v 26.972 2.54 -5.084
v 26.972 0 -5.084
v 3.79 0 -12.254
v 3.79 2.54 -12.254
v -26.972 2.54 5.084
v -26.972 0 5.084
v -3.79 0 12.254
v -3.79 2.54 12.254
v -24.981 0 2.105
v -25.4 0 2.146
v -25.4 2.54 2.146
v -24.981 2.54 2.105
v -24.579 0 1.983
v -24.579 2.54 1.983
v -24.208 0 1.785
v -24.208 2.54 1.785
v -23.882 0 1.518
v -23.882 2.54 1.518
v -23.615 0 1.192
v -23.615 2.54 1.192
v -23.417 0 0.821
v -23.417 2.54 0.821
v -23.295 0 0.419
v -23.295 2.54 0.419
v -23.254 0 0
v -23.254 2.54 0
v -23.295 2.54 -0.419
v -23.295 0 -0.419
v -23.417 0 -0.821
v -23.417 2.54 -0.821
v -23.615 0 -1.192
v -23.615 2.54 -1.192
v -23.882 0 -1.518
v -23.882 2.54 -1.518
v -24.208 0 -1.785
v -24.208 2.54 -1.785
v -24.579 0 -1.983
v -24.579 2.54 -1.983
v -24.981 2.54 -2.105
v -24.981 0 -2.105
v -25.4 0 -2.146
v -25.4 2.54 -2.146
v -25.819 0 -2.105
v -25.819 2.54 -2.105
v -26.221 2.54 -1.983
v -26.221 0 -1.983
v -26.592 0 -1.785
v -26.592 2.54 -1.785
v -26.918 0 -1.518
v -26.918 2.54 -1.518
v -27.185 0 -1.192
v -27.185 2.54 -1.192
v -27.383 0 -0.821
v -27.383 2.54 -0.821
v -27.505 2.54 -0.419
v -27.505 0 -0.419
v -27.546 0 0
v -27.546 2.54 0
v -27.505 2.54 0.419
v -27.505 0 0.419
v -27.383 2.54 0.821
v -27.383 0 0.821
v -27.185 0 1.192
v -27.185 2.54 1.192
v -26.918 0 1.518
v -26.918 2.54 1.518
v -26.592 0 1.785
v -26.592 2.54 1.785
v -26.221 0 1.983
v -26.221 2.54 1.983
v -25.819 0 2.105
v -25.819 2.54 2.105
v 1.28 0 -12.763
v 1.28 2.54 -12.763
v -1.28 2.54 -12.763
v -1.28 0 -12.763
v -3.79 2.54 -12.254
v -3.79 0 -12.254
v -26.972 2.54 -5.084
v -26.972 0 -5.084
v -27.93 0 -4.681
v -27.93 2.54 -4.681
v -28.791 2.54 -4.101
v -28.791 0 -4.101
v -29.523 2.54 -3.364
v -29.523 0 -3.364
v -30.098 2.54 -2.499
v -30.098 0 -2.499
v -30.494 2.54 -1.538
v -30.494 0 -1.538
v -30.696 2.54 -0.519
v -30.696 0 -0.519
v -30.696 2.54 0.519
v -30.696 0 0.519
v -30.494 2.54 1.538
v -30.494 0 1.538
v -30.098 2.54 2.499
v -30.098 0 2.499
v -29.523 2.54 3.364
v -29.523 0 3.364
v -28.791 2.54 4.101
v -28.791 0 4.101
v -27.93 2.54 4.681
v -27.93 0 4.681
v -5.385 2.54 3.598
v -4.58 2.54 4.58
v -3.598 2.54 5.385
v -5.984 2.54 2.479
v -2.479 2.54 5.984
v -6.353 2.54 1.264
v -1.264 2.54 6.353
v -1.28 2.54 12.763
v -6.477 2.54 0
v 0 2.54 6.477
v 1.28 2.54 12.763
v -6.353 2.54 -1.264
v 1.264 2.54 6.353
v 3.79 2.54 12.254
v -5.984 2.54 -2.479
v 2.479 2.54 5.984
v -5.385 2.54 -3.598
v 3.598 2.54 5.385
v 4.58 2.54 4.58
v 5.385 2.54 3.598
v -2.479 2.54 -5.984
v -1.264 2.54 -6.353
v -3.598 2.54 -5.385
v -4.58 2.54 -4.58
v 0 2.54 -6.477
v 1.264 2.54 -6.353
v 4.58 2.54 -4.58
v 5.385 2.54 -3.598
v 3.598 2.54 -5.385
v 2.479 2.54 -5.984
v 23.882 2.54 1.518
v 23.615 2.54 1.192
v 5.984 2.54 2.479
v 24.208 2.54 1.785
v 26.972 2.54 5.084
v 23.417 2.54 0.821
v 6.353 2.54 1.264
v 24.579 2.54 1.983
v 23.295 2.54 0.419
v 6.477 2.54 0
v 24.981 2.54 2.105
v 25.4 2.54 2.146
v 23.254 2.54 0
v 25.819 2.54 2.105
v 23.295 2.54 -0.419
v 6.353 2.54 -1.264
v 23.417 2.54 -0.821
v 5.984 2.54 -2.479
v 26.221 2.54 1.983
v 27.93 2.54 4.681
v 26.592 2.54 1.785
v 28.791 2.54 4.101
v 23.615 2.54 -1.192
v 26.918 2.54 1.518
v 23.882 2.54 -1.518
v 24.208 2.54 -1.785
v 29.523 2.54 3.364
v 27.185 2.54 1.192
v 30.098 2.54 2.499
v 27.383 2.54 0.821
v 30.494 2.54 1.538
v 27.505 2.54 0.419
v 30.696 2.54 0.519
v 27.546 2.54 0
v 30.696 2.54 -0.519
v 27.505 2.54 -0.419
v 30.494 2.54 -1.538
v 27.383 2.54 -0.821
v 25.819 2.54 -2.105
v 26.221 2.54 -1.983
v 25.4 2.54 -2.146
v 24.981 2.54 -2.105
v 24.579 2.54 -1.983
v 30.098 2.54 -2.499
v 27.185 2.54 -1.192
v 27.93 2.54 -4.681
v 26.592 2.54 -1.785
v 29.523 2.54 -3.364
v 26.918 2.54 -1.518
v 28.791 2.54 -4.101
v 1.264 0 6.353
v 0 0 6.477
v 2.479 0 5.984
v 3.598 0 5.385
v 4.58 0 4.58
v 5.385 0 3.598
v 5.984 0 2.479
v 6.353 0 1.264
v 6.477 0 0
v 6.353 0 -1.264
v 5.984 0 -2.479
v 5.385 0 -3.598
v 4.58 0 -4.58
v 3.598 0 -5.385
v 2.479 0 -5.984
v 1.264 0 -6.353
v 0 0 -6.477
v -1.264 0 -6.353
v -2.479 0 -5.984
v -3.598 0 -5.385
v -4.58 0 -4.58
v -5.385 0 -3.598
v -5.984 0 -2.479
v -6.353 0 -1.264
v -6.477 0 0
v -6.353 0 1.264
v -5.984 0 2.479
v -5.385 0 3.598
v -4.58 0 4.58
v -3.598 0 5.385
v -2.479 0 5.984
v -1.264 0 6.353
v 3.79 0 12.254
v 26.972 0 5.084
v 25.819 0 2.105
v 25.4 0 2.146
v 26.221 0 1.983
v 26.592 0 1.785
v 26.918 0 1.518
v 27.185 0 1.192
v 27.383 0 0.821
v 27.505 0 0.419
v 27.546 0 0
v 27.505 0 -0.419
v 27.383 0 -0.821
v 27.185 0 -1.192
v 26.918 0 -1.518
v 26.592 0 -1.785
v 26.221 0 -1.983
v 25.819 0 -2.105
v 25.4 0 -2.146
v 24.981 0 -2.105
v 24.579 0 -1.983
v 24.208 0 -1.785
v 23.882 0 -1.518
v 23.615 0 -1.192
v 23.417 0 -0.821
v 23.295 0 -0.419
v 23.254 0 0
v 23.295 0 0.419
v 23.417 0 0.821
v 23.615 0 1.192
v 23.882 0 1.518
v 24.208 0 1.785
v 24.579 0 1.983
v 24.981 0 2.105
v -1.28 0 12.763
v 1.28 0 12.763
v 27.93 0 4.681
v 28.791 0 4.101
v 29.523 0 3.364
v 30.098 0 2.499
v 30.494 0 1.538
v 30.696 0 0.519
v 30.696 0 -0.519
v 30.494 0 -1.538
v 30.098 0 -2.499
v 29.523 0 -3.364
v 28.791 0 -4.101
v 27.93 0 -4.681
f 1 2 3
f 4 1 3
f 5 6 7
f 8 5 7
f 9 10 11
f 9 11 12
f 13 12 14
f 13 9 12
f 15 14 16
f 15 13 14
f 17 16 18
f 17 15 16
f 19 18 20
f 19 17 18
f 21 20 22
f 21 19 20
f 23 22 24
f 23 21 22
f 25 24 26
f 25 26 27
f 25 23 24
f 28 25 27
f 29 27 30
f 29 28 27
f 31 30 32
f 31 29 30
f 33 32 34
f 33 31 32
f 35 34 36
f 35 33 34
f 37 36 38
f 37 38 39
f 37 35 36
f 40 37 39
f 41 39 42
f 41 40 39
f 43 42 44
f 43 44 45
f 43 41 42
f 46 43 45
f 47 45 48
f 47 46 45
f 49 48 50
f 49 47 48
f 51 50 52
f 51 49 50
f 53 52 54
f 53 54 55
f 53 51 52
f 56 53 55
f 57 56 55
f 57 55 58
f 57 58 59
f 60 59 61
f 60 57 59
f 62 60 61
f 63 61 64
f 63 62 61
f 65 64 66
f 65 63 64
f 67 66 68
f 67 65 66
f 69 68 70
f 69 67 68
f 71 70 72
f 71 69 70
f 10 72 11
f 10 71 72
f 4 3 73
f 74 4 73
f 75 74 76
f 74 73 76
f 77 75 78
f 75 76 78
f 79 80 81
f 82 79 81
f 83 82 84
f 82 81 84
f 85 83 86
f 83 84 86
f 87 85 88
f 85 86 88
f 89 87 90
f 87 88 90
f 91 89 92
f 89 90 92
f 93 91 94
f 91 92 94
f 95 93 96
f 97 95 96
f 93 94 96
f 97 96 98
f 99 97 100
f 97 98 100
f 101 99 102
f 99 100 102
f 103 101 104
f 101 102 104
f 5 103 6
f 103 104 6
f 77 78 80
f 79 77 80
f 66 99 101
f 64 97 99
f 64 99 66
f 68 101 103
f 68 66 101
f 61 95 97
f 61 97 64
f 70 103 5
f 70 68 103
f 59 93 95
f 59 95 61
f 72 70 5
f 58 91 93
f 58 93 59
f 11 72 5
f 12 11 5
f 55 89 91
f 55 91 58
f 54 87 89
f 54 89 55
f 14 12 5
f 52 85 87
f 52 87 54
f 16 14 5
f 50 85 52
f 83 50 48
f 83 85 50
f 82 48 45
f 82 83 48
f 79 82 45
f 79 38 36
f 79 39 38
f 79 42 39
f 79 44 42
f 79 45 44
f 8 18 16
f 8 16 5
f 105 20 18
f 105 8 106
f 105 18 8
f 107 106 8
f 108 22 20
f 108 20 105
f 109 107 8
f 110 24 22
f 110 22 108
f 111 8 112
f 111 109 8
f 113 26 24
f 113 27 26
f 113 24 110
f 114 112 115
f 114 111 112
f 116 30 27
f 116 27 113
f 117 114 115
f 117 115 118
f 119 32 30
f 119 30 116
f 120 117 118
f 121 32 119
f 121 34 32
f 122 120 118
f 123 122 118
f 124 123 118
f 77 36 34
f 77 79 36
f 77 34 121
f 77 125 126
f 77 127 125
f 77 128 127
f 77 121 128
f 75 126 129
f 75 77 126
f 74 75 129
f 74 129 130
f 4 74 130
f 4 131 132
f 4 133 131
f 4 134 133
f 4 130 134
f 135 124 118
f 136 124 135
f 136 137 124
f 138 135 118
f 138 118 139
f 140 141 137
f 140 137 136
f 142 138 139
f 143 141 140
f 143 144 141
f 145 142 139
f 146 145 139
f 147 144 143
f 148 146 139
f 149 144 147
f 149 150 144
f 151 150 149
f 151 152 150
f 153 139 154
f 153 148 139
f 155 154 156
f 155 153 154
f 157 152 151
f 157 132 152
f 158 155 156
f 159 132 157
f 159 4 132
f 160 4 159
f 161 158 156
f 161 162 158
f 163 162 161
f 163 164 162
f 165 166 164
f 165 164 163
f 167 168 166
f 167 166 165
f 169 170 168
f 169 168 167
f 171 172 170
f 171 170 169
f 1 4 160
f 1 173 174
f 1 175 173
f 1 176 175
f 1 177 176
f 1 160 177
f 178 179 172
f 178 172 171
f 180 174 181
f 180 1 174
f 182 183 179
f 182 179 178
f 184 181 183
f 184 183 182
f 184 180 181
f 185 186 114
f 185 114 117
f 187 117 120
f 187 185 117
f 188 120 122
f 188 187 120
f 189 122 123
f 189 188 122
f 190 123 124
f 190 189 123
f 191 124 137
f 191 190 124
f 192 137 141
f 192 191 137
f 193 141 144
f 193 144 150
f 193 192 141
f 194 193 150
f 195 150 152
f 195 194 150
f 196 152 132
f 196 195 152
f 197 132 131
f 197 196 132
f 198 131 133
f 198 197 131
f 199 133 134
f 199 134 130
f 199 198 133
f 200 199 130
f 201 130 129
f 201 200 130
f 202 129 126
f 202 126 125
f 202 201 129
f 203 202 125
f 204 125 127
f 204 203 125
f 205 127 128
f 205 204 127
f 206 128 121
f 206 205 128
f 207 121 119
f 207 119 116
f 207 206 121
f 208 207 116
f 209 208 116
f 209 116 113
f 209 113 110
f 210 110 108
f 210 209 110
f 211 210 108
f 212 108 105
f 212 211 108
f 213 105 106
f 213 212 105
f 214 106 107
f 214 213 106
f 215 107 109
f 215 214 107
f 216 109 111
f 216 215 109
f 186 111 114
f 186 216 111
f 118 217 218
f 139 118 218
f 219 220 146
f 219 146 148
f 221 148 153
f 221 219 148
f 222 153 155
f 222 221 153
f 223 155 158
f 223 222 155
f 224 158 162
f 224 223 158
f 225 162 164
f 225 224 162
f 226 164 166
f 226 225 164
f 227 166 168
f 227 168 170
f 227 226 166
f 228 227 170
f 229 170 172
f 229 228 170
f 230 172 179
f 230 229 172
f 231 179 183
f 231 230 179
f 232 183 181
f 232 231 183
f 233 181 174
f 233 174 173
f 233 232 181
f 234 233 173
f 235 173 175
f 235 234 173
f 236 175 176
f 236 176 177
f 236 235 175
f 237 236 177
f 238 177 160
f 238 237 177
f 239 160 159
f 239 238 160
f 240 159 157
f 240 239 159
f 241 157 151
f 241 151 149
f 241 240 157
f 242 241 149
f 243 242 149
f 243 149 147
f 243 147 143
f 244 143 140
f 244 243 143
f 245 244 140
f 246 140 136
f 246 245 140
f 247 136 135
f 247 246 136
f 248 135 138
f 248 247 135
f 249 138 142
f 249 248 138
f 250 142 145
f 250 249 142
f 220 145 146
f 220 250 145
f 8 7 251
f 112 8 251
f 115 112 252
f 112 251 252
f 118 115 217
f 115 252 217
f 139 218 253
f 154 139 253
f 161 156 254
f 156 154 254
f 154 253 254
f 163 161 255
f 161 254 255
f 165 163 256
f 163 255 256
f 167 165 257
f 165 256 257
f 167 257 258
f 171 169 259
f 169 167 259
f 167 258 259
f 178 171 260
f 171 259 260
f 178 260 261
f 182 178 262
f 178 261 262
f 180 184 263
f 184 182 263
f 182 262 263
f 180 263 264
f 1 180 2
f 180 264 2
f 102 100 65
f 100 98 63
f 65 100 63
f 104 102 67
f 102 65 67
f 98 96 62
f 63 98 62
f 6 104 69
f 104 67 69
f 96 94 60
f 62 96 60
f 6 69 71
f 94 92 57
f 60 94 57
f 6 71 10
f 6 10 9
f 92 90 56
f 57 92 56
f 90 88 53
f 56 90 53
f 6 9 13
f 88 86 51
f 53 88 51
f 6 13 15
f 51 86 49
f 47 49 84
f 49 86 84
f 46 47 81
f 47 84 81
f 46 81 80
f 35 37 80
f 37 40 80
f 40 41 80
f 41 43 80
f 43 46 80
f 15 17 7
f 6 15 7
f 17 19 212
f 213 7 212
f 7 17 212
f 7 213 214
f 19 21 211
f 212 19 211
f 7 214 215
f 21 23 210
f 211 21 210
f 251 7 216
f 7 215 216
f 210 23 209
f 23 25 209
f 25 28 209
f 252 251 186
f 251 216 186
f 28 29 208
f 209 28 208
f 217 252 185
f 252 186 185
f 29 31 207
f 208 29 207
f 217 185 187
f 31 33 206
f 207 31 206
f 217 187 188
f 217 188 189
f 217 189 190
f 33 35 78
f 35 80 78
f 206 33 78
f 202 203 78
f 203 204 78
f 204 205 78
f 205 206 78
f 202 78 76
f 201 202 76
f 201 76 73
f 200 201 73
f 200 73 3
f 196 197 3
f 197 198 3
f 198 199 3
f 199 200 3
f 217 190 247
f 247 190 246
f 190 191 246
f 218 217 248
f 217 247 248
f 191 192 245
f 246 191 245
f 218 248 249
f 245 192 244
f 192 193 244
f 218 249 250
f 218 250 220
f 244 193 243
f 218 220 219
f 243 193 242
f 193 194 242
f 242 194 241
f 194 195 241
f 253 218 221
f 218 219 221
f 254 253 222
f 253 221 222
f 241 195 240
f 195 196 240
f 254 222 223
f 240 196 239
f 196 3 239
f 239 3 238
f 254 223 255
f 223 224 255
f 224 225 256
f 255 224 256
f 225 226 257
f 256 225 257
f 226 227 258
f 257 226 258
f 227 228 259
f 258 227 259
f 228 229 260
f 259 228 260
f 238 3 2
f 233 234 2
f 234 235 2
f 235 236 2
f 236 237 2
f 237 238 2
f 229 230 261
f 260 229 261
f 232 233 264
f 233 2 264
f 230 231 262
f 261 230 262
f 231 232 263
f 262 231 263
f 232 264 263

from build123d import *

# Parameters (mm, degrees)
SKETCH1_R           = 5.3213
SKETCH1_R_2         = 2.1463
SKETCH1_R_3         = 12.827
SKETCH1_R_4         = 6.477
BOSS_EXTRUDE1_DEPTH = 2.54


with BuildPart() as part:
    # Sketch1 → Boss-Extrude1 (new body)
    # profile 1 of 5: a face of its own
    with BuildSketch(Plane(origin=(0, 0, 0), x_dir=(1, 0, 0), z_dir=(0, 1, 0))):
        with BuildLine():
            Line((-3.7903785, 12.25418132), (-26.97244415, 5.08366532))
            ThreePointArc((-26.97244415, 5.08366532), (-22.241773707, 4.282737486), (-20.0787, 0))
            ThreePointArc((-20.0787, 0), (-22.241773707, -4.282737486), (-26.97244415, -5.08366532))
            Line((-26.97244415, -5.08366532), (-3.7903785, -12.25418132))
            ThreePointArc((-3.7903785, -12.25418132), (-12.827, 0), (-3.7903785, 12.25418132))
        make_face()
    # profile 2 of 5: a face of its own
    with BuildSketch(Plane(origin=(0, 0, 0), x_dir=(1, 0, 0), z_dir=(0, 1, 0))):
        with Locations((-25.4, 0)):
            Circle(SKETCH1_R)
        with Locations(Location((-25.4, 0, 0), (0, 0, 270))):
            Circle(SKETCH1_R_2, mode=Mode.SUBTRACT)
    # profile 3 of 5: a face of its own
    with BuildSketch(Plane(origin=(0, 0, 0), x_dir=(1, 0, 0), z_dir=(0, 1, 0))):
        Circle(SKETCH1_R_3)
        with Locations(Location((0, 0, 0), (0, 0, 270))):
            Circle(SKETCH1_R_4, mode=Mode.SUBTRACT)
    # profile 4 of 5: a face of its own
    with BuildSketch(Plane(origin=(0, 0, 0), x_dir=(1, 0, 0), z_dir=(0, 1, 0))):
        with BuildLine():
            Line((26.97244415, 5.08366532), (3.7903785, 12.25418132))
            ThreePointArc((3.7903785, 12.25418132), (10.32354382, 7.612908248), (12.827, 0))
            ThreePointArc((12.827, 0), (10.32354382, -7.612908248), (3.7903785, -12.25418132))
            Line((3.7903785, -12.25418132), (26.97244415, -5.08366532))
            ThreePointArc((26.97244415, -5.08366532), (20.0787, 0), (26.97244415, 5.08366532))
        make_face()
    # profile 5 of 5: a face of its own
    with BuildSketch(Plane(origin=(0, 0, 0), x_dir=(1, 0, 0), z_dir=(0, 1, 0))):
        with Locations((25.4, 0)):
            Circle(SKETCH1_R)
        with Locations(Location((25.4, 0, 0), (0, 0, 270))):
            Circle(SKETCH1_R_2, mode=Mode.SUBTRACT)
    extrude(amount=BOSS_EXTRUDE1_DEPTH)


solid = part.part
